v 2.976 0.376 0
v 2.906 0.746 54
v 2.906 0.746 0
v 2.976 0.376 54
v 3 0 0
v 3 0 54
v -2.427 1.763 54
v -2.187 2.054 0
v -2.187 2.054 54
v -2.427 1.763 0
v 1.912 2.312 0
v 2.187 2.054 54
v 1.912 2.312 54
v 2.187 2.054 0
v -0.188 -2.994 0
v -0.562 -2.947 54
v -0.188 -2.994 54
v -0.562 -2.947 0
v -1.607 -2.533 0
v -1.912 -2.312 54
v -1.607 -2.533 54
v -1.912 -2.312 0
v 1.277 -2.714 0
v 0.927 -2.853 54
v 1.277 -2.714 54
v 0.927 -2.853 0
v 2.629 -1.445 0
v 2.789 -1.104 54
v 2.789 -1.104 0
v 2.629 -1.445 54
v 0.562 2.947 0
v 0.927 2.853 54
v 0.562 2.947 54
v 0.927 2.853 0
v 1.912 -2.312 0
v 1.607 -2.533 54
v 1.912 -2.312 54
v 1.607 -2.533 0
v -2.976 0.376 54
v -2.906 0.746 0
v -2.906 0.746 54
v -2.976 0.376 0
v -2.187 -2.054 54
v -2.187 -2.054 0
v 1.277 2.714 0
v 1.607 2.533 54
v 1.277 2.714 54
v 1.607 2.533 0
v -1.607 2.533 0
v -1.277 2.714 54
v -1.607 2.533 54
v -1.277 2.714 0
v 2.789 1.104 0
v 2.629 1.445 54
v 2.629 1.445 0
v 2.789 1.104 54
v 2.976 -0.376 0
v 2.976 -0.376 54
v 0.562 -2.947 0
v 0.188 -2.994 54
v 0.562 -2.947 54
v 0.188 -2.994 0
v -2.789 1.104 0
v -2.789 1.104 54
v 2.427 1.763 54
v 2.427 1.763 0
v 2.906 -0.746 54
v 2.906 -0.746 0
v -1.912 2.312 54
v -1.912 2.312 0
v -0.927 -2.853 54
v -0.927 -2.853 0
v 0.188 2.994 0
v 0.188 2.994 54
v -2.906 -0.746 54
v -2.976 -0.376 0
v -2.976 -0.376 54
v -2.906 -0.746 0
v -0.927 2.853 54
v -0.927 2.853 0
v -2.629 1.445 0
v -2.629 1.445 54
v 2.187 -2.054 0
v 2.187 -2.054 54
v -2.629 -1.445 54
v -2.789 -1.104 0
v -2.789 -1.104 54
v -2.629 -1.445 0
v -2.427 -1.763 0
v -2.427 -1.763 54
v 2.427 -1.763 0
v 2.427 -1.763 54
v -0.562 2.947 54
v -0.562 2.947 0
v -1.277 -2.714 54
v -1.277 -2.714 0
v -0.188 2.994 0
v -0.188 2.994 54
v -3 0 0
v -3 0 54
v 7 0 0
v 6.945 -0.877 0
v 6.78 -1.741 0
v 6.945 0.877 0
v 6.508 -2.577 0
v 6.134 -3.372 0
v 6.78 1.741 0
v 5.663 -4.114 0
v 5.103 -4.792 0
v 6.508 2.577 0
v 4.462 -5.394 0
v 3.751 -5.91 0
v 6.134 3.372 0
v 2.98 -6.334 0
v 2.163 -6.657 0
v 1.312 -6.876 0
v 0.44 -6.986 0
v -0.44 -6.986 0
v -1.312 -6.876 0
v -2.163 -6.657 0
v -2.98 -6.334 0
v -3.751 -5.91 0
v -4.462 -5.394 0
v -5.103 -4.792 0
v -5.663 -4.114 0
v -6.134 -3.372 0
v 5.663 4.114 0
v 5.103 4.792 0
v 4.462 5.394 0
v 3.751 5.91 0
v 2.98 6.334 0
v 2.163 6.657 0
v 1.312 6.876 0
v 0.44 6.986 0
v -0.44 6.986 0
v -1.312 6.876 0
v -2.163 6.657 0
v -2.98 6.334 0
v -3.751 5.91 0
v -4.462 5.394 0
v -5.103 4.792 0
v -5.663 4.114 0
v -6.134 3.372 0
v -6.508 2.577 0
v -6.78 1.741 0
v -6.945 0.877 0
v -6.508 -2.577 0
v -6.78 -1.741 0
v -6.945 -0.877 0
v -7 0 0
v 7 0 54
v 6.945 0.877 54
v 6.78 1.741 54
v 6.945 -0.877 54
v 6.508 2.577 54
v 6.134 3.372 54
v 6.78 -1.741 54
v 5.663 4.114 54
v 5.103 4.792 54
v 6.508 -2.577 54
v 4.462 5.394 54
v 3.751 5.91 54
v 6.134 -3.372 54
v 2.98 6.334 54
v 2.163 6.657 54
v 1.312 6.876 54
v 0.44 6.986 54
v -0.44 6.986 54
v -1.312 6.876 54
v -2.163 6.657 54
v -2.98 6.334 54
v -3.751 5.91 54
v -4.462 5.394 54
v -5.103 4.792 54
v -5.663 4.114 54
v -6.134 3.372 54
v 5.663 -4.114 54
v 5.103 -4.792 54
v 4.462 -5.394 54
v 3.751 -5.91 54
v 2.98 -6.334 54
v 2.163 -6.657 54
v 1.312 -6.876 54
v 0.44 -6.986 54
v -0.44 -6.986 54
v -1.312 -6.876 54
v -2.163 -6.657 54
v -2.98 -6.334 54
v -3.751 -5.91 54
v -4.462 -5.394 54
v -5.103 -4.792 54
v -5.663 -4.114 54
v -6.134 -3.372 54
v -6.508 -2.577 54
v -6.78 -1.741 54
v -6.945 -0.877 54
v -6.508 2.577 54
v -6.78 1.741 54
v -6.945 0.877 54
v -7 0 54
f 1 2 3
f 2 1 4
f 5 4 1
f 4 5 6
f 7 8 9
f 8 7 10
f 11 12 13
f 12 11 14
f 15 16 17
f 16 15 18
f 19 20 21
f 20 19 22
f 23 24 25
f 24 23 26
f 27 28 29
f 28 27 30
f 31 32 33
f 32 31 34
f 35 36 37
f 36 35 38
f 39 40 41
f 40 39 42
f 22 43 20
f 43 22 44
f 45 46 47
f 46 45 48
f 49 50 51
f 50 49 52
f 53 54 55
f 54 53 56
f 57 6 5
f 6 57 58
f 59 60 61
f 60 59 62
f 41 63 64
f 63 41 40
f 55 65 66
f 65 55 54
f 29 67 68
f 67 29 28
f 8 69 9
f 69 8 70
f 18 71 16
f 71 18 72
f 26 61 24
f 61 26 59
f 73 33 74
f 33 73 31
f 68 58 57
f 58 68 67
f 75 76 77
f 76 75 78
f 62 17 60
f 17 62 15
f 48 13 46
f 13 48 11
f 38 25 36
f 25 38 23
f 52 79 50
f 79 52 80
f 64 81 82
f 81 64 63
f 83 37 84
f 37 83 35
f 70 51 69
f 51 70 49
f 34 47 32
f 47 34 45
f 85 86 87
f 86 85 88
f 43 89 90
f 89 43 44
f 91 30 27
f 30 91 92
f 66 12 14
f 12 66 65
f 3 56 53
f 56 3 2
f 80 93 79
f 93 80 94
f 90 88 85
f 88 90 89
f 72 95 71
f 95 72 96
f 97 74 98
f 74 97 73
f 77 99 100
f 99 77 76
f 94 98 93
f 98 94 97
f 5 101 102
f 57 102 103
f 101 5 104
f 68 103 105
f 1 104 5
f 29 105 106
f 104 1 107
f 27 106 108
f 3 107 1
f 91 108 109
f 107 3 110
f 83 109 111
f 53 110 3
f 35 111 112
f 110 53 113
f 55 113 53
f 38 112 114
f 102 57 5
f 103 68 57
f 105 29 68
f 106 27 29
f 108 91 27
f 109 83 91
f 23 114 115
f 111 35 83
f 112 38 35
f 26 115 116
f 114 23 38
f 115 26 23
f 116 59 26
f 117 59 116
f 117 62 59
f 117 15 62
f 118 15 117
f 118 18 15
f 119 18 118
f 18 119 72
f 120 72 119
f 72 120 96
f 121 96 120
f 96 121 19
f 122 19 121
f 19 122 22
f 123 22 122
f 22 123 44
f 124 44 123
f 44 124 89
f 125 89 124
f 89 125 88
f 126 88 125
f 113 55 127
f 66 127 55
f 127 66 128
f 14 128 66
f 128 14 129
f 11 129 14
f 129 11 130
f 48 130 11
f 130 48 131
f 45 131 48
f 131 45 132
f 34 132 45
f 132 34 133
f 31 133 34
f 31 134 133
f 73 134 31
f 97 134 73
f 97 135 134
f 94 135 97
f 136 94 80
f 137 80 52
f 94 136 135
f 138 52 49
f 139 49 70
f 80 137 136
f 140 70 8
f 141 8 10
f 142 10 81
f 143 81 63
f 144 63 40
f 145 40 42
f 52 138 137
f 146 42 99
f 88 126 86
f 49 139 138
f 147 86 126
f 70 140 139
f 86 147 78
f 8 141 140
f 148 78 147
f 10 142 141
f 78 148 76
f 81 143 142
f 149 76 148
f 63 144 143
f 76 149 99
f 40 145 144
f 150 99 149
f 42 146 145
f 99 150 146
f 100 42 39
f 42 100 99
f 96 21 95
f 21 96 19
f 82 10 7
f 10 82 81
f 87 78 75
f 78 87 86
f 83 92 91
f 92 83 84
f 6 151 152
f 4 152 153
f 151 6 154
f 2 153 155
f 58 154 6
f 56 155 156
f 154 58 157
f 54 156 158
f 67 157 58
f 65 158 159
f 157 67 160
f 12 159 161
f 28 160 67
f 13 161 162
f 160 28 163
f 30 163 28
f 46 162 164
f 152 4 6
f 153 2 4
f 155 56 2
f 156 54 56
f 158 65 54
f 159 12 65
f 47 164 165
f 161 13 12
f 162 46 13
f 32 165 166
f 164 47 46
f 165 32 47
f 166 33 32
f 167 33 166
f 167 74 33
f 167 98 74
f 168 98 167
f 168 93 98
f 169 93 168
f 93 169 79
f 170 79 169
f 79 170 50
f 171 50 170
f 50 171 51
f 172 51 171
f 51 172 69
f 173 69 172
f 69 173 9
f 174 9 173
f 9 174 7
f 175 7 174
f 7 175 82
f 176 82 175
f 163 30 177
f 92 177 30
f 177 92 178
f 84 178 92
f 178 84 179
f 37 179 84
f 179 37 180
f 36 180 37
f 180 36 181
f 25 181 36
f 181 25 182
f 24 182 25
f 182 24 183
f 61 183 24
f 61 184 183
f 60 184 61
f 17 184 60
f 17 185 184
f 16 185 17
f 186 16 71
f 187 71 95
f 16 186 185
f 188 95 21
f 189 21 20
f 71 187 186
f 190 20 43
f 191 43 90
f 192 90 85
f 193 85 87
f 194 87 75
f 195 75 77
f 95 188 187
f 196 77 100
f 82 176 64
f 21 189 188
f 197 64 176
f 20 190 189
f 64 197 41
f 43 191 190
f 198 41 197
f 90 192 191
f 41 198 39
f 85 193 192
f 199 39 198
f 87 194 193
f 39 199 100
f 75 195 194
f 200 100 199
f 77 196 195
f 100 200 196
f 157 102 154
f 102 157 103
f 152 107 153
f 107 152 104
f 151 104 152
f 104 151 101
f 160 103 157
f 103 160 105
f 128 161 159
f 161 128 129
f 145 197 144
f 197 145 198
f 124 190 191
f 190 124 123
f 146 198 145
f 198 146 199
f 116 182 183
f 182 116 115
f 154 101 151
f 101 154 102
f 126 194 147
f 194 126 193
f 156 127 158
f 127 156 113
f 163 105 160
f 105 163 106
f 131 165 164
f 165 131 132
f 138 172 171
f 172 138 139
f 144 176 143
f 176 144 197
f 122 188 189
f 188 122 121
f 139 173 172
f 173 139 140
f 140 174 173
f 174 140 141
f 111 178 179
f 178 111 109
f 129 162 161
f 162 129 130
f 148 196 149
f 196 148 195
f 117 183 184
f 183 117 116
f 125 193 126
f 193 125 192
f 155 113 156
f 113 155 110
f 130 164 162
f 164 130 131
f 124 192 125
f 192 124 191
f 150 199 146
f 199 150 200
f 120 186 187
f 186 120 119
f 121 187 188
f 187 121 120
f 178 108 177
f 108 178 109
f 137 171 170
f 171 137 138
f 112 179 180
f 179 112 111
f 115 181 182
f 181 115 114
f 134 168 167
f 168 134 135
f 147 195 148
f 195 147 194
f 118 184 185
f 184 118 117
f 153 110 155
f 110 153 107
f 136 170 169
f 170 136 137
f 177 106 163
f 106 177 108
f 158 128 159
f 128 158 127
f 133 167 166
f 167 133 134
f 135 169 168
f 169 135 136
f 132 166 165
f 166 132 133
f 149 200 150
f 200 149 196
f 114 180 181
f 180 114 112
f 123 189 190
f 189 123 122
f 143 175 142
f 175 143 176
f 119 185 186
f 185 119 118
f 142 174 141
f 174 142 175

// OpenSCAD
$fn = 50;

difference() {
	union() {
		cylinder(h = 54, r = 7.0);
	}
	union() {
		cylinder(h = 54, r = 3.0);
		cylinder(h = 54, r = 1.5);
	}
}
